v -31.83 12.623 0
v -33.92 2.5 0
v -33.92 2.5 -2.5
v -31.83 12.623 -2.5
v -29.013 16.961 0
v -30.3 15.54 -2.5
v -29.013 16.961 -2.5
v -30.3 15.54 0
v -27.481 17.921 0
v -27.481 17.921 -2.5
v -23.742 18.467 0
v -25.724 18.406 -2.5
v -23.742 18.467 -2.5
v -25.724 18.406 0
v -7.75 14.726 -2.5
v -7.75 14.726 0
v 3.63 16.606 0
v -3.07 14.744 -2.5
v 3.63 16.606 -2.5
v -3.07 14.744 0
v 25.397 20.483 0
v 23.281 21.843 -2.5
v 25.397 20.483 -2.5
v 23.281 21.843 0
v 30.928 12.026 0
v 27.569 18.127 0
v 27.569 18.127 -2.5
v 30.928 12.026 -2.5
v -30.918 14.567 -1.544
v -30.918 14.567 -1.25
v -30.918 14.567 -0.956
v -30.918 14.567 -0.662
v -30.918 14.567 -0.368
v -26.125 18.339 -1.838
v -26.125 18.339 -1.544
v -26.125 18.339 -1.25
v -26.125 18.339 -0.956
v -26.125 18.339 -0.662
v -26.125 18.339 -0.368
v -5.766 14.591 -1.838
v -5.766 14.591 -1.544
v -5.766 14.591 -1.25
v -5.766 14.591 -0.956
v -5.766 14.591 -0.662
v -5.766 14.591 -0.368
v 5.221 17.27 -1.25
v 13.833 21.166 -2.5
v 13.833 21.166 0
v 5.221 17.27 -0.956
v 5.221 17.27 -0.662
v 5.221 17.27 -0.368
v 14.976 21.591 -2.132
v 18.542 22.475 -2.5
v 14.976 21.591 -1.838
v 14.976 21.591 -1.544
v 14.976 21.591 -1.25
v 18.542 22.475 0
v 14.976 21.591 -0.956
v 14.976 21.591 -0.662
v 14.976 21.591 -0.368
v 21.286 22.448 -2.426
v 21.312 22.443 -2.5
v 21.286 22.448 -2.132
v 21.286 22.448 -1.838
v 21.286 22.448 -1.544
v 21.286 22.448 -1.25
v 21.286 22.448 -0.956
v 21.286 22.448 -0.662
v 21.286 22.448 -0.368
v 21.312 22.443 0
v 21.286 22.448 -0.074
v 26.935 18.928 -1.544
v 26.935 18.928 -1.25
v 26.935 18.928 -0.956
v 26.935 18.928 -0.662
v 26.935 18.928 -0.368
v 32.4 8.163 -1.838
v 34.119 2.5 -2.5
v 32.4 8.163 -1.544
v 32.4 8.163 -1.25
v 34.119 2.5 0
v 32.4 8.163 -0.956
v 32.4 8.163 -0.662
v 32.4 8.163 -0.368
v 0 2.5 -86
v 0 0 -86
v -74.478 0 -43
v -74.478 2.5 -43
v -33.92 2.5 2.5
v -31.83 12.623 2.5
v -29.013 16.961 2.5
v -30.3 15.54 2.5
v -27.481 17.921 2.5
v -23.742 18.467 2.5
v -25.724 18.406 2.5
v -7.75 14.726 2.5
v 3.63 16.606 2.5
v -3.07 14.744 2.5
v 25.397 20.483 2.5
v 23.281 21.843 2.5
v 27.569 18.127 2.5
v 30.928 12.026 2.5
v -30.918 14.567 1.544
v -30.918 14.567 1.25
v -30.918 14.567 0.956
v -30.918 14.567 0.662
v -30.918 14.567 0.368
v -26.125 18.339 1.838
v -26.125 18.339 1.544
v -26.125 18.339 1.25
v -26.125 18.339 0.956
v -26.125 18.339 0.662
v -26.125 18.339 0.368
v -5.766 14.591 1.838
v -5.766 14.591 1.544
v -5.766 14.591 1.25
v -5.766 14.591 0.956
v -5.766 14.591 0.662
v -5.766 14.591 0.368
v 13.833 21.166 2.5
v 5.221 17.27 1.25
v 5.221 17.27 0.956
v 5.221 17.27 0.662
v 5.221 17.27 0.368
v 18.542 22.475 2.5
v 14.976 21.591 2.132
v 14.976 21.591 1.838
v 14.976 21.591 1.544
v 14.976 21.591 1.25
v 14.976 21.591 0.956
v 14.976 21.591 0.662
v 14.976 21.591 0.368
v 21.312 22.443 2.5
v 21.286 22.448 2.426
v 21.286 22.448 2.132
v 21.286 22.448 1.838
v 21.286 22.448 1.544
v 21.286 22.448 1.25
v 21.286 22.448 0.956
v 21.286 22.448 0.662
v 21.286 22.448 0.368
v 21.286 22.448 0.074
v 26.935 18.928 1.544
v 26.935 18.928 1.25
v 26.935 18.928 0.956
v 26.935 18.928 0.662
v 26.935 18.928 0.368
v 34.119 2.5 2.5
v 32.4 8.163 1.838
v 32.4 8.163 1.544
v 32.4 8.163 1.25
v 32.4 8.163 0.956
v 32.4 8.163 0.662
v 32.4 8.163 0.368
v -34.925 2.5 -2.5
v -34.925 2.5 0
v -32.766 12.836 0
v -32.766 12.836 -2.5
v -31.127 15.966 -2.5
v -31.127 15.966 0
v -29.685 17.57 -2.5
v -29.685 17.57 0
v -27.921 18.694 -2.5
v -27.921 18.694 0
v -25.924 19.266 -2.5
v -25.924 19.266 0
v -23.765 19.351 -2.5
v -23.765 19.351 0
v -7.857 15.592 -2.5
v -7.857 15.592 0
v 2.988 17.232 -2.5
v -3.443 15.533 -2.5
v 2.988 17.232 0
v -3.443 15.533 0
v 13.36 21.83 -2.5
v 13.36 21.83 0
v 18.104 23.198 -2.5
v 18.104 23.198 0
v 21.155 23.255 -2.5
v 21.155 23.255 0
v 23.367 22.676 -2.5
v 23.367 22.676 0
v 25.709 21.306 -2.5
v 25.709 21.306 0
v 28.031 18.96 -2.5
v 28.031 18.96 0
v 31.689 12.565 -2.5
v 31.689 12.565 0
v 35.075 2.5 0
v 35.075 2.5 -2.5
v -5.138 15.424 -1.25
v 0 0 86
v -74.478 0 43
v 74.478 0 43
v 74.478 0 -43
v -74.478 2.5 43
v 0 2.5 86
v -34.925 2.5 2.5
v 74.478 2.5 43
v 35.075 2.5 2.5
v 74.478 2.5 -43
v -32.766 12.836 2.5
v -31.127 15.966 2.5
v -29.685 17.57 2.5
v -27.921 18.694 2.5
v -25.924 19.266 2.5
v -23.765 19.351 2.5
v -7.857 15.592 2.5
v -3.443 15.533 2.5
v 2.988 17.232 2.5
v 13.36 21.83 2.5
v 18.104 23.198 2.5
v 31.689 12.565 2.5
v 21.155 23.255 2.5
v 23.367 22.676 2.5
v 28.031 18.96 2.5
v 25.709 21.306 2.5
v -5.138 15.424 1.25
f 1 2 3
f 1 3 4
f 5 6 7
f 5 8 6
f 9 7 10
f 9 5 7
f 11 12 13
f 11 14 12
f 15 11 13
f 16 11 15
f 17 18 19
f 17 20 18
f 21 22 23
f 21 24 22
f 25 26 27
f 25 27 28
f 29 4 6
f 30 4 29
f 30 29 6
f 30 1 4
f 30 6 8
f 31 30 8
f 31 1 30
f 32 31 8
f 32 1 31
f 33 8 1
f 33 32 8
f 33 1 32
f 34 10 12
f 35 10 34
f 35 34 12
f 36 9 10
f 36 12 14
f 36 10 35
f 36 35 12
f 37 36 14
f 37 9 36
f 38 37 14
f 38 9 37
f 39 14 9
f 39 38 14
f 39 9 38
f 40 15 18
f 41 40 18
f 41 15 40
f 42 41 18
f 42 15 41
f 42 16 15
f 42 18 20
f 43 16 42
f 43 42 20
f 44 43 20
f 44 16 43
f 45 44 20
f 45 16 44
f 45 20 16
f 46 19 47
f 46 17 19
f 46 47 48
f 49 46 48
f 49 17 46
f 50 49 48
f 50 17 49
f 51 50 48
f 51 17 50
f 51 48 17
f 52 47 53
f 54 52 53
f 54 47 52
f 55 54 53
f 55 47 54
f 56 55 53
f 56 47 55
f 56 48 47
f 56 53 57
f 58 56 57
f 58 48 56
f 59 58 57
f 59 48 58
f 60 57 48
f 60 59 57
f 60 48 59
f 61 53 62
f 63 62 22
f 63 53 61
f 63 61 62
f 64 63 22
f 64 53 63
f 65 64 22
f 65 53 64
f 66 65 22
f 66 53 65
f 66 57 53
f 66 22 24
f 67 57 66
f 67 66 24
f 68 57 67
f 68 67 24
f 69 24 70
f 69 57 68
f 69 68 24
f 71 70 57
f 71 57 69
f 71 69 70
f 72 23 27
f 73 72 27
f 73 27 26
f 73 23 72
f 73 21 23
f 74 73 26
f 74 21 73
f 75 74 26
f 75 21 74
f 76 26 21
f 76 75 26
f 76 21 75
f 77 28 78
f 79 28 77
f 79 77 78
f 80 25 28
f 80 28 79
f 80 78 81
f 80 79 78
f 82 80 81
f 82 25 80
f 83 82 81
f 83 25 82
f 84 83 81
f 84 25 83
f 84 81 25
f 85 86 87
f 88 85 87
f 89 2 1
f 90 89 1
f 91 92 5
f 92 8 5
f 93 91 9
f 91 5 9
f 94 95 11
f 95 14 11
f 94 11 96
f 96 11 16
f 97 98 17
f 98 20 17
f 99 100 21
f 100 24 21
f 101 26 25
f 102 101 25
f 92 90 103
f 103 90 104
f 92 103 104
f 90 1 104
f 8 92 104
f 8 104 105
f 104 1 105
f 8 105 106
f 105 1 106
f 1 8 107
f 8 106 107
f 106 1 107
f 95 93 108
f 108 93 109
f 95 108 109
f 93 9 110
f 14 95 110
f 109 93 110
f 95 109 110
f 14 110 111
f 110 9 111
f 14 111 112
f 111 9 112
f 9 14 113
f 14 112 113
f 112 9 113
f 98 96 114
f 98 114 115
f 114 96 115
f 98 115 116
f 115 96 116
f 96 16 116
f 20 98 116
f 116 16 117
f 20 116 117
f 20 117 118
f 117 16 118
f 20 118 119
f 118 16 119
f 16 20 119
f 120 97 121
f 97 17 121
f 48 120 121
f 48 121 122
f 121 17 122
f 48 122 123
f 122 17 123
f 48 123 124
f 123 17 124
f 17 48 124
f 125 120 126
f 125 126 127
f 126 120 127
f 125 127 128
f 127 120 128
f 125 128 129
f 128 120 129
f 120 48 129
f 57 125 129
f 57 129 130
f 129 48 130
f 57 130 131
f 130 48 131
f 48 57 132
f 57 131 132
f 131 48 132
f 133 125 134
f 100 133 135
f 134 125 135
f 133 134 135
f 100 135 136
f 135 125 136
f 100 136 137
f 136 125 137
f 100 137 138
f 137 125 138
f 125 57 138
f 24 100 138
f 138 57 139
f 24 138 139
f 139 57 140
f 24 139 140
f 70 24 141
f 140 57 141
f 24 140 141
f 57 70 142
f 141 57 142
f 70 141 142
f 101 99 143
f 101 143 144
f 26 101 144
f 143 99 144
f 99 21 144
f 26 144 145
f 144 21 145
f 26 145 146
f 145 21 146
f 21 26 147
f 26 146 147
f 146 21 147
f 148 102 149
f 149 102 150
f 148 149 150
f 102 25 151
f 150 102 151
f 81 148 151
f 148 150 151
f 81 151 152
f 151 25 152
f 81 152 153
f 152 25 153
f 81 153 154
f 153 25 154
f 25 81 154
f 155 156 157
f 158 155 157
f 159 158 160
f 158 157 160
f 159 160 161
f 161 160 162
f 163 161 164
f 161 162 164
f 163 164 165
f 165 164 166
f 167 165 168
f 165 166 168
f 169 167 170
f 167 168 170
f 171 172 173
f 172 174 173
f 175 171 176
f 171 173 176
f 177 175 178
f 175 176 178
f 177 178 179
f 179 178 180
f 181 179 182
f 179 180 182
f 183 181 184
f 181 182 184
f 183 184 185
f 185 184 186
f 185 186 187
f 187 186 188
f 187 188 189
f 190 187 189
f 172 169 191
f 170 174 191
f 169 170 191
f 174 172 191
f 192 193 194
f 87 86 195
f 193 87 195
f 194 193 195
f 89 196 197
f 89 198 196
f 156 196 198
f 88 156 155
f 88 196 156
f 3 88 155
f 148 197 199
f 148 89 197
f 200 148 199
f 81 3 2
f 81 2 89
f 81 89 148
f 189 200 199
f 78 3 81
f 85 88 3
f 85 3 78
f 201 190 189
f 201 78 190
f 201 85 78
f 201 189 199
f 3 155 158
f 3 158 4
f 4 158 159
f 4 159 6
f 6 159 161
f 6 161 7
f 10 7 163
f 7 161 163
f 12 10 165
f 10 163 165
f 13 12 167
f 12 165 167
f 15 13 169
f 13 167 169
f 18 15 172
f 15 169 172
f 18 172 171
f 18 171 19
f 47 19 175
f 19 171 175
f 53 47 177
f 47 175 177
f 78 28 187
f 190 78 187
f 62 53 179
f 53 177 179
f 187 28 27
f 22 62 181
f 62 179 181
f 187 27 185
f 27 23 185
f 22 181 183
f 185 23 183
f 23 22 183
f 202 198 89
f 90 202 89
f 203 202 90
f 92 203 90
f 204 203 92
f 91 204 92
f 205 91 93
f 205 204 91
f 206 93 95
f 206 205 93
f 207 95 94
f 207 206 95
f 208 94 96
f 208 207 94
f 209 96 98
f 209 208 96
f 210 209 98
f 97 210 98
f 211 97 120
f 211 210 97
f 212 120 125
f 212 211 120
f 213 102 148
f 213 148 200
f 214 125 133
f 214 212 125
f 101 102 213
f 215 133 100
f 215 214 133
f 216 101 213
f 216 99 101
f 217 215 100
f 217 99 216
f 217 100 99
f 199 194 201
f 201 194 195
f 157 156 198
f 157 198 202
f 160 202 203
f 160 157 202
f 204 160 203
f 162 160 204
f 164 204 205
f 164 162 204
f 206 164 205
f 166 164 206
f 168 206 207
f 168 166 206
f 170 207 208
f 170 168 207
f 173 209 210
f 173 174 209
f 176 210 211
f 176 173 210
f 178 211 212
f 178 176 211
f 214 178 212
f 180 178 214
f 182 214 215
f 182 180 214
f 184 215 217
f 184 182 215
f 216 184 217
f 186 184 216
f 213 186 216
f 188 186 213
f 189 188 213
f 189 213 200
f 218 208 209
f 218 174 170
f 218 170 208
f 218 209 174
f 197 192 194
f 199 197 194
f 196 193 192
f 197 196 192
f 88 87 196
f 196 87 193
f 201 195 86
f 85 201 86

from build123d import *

# Parameters (mm, degrees)
BOSS_EXTRUDE1_DEPTH = 2.5
BOSS_EXTRUDE3_DEPTH = 2.5


with BuildPart() as part:
    # Sketch1 → Boss-Extrude1 (new body)
    with BuildSketch(Plane(origin=(0, 0, 0), x_dir=(1, 0, 0), z_dir=(0, 1, 0))):
        Polygon((74.478184725, 43), (0, 86), (-74.478184725, 43), (-74.478184725, -43), (0, -86), (74.478184725, -43), align=None)
    extrude(amount=BOSS_EXTRUDE1_DEPTH)

    # Sketch3 → Boss-Extrude3 (add, symmetric)
    with BuildSketch(Plane.XY):
        with BuildLine():
            Line((-34.925061785, 2.5), (-33.920058448, 2.5))
            add(Edge.make_bspline(
                [(-33.920058448, 2.5), (-33.917714333, 2.524136942), (-33.913611653, 2.566166439), (-33.866227824, 3.047358518), (-33.766675223, 3.968656997), (-33.543636065, 5.697492998), (-33.208094305, 7.727036524), (-32.732470915, 9.857688537), (-32.007597516, 12.3221702), (-30.947827565, 14.726109244), (-29.496843491, 16.656599478), (-27.918808177, 17.817788786), (-25.584089516, 18.616023277), (-22.027089573, 18.448365095), (-16.980597414, 17.01454632), (-11.504417112, 15.301442536), (-6.727145071, 14.453209419), (-2.889367791, 14.698102091), (0.821978206, 15.488717654), (5.270865061, 17.204085784), (10.310286951, 19.65834123), (15.042453427, 21.768085831), (18.653774649, 22.640567877), (21.300542559, 22.524752908), (23.196966016, 21.975950032), (25.06481994, 20.867848988), (26.936162582, 19.06478675), (28.798725849, 16.441516786), (30.32418762, 13.488682834), (31.519963625, 10.621236271), (32.402488107, 8.209159025), (33.126607206, 5.965942013), (33.665257214, 4.140301082), (33.931776285, 3.187716336), (34.072246391, 2.672840674), (34.101906516, 2.563465), (34.119055988, 2.5)],
                knots=[0, 0, 0, 0, 0.000400295, 0.000667158, 0.0078125, 0.015625, 0.03125, 0.046875, 0.0625, 0.09375, 0.125, 0.15625, 0.1875, 0.25, 0.3125, 0.375, 0.4375, 0.46875, 0.5, 0.5625, 0.625, 0.6875, 0.75, 0.78125, 0.8125, 0.84375, 0.875, 0.90625, 0.9375, 0.953125, 0.96875, 0.984375, 0.9921875, 0.998375544, 0.999025327, 1, 1, 1, 1], degree=3))
            Line((34.119055988, 2.5), (35.074938215, 2.5))
            add(Edge.make_bspline(
                [(-34.925061785, 2.5), (-32.150541188, 30.388634665), (-0.320997251, -3.695090393), (25.079154745, 39.838944932), (35.074938215, 2.5)],
                knots=[0, 0, 0, 0, 0.444258071, 1, 1, 1, 1], degree=3))
        make_face()
    extrude(amount=BOSS_EXTRUDE3_DEPTH, both=True)


solid = part.part
